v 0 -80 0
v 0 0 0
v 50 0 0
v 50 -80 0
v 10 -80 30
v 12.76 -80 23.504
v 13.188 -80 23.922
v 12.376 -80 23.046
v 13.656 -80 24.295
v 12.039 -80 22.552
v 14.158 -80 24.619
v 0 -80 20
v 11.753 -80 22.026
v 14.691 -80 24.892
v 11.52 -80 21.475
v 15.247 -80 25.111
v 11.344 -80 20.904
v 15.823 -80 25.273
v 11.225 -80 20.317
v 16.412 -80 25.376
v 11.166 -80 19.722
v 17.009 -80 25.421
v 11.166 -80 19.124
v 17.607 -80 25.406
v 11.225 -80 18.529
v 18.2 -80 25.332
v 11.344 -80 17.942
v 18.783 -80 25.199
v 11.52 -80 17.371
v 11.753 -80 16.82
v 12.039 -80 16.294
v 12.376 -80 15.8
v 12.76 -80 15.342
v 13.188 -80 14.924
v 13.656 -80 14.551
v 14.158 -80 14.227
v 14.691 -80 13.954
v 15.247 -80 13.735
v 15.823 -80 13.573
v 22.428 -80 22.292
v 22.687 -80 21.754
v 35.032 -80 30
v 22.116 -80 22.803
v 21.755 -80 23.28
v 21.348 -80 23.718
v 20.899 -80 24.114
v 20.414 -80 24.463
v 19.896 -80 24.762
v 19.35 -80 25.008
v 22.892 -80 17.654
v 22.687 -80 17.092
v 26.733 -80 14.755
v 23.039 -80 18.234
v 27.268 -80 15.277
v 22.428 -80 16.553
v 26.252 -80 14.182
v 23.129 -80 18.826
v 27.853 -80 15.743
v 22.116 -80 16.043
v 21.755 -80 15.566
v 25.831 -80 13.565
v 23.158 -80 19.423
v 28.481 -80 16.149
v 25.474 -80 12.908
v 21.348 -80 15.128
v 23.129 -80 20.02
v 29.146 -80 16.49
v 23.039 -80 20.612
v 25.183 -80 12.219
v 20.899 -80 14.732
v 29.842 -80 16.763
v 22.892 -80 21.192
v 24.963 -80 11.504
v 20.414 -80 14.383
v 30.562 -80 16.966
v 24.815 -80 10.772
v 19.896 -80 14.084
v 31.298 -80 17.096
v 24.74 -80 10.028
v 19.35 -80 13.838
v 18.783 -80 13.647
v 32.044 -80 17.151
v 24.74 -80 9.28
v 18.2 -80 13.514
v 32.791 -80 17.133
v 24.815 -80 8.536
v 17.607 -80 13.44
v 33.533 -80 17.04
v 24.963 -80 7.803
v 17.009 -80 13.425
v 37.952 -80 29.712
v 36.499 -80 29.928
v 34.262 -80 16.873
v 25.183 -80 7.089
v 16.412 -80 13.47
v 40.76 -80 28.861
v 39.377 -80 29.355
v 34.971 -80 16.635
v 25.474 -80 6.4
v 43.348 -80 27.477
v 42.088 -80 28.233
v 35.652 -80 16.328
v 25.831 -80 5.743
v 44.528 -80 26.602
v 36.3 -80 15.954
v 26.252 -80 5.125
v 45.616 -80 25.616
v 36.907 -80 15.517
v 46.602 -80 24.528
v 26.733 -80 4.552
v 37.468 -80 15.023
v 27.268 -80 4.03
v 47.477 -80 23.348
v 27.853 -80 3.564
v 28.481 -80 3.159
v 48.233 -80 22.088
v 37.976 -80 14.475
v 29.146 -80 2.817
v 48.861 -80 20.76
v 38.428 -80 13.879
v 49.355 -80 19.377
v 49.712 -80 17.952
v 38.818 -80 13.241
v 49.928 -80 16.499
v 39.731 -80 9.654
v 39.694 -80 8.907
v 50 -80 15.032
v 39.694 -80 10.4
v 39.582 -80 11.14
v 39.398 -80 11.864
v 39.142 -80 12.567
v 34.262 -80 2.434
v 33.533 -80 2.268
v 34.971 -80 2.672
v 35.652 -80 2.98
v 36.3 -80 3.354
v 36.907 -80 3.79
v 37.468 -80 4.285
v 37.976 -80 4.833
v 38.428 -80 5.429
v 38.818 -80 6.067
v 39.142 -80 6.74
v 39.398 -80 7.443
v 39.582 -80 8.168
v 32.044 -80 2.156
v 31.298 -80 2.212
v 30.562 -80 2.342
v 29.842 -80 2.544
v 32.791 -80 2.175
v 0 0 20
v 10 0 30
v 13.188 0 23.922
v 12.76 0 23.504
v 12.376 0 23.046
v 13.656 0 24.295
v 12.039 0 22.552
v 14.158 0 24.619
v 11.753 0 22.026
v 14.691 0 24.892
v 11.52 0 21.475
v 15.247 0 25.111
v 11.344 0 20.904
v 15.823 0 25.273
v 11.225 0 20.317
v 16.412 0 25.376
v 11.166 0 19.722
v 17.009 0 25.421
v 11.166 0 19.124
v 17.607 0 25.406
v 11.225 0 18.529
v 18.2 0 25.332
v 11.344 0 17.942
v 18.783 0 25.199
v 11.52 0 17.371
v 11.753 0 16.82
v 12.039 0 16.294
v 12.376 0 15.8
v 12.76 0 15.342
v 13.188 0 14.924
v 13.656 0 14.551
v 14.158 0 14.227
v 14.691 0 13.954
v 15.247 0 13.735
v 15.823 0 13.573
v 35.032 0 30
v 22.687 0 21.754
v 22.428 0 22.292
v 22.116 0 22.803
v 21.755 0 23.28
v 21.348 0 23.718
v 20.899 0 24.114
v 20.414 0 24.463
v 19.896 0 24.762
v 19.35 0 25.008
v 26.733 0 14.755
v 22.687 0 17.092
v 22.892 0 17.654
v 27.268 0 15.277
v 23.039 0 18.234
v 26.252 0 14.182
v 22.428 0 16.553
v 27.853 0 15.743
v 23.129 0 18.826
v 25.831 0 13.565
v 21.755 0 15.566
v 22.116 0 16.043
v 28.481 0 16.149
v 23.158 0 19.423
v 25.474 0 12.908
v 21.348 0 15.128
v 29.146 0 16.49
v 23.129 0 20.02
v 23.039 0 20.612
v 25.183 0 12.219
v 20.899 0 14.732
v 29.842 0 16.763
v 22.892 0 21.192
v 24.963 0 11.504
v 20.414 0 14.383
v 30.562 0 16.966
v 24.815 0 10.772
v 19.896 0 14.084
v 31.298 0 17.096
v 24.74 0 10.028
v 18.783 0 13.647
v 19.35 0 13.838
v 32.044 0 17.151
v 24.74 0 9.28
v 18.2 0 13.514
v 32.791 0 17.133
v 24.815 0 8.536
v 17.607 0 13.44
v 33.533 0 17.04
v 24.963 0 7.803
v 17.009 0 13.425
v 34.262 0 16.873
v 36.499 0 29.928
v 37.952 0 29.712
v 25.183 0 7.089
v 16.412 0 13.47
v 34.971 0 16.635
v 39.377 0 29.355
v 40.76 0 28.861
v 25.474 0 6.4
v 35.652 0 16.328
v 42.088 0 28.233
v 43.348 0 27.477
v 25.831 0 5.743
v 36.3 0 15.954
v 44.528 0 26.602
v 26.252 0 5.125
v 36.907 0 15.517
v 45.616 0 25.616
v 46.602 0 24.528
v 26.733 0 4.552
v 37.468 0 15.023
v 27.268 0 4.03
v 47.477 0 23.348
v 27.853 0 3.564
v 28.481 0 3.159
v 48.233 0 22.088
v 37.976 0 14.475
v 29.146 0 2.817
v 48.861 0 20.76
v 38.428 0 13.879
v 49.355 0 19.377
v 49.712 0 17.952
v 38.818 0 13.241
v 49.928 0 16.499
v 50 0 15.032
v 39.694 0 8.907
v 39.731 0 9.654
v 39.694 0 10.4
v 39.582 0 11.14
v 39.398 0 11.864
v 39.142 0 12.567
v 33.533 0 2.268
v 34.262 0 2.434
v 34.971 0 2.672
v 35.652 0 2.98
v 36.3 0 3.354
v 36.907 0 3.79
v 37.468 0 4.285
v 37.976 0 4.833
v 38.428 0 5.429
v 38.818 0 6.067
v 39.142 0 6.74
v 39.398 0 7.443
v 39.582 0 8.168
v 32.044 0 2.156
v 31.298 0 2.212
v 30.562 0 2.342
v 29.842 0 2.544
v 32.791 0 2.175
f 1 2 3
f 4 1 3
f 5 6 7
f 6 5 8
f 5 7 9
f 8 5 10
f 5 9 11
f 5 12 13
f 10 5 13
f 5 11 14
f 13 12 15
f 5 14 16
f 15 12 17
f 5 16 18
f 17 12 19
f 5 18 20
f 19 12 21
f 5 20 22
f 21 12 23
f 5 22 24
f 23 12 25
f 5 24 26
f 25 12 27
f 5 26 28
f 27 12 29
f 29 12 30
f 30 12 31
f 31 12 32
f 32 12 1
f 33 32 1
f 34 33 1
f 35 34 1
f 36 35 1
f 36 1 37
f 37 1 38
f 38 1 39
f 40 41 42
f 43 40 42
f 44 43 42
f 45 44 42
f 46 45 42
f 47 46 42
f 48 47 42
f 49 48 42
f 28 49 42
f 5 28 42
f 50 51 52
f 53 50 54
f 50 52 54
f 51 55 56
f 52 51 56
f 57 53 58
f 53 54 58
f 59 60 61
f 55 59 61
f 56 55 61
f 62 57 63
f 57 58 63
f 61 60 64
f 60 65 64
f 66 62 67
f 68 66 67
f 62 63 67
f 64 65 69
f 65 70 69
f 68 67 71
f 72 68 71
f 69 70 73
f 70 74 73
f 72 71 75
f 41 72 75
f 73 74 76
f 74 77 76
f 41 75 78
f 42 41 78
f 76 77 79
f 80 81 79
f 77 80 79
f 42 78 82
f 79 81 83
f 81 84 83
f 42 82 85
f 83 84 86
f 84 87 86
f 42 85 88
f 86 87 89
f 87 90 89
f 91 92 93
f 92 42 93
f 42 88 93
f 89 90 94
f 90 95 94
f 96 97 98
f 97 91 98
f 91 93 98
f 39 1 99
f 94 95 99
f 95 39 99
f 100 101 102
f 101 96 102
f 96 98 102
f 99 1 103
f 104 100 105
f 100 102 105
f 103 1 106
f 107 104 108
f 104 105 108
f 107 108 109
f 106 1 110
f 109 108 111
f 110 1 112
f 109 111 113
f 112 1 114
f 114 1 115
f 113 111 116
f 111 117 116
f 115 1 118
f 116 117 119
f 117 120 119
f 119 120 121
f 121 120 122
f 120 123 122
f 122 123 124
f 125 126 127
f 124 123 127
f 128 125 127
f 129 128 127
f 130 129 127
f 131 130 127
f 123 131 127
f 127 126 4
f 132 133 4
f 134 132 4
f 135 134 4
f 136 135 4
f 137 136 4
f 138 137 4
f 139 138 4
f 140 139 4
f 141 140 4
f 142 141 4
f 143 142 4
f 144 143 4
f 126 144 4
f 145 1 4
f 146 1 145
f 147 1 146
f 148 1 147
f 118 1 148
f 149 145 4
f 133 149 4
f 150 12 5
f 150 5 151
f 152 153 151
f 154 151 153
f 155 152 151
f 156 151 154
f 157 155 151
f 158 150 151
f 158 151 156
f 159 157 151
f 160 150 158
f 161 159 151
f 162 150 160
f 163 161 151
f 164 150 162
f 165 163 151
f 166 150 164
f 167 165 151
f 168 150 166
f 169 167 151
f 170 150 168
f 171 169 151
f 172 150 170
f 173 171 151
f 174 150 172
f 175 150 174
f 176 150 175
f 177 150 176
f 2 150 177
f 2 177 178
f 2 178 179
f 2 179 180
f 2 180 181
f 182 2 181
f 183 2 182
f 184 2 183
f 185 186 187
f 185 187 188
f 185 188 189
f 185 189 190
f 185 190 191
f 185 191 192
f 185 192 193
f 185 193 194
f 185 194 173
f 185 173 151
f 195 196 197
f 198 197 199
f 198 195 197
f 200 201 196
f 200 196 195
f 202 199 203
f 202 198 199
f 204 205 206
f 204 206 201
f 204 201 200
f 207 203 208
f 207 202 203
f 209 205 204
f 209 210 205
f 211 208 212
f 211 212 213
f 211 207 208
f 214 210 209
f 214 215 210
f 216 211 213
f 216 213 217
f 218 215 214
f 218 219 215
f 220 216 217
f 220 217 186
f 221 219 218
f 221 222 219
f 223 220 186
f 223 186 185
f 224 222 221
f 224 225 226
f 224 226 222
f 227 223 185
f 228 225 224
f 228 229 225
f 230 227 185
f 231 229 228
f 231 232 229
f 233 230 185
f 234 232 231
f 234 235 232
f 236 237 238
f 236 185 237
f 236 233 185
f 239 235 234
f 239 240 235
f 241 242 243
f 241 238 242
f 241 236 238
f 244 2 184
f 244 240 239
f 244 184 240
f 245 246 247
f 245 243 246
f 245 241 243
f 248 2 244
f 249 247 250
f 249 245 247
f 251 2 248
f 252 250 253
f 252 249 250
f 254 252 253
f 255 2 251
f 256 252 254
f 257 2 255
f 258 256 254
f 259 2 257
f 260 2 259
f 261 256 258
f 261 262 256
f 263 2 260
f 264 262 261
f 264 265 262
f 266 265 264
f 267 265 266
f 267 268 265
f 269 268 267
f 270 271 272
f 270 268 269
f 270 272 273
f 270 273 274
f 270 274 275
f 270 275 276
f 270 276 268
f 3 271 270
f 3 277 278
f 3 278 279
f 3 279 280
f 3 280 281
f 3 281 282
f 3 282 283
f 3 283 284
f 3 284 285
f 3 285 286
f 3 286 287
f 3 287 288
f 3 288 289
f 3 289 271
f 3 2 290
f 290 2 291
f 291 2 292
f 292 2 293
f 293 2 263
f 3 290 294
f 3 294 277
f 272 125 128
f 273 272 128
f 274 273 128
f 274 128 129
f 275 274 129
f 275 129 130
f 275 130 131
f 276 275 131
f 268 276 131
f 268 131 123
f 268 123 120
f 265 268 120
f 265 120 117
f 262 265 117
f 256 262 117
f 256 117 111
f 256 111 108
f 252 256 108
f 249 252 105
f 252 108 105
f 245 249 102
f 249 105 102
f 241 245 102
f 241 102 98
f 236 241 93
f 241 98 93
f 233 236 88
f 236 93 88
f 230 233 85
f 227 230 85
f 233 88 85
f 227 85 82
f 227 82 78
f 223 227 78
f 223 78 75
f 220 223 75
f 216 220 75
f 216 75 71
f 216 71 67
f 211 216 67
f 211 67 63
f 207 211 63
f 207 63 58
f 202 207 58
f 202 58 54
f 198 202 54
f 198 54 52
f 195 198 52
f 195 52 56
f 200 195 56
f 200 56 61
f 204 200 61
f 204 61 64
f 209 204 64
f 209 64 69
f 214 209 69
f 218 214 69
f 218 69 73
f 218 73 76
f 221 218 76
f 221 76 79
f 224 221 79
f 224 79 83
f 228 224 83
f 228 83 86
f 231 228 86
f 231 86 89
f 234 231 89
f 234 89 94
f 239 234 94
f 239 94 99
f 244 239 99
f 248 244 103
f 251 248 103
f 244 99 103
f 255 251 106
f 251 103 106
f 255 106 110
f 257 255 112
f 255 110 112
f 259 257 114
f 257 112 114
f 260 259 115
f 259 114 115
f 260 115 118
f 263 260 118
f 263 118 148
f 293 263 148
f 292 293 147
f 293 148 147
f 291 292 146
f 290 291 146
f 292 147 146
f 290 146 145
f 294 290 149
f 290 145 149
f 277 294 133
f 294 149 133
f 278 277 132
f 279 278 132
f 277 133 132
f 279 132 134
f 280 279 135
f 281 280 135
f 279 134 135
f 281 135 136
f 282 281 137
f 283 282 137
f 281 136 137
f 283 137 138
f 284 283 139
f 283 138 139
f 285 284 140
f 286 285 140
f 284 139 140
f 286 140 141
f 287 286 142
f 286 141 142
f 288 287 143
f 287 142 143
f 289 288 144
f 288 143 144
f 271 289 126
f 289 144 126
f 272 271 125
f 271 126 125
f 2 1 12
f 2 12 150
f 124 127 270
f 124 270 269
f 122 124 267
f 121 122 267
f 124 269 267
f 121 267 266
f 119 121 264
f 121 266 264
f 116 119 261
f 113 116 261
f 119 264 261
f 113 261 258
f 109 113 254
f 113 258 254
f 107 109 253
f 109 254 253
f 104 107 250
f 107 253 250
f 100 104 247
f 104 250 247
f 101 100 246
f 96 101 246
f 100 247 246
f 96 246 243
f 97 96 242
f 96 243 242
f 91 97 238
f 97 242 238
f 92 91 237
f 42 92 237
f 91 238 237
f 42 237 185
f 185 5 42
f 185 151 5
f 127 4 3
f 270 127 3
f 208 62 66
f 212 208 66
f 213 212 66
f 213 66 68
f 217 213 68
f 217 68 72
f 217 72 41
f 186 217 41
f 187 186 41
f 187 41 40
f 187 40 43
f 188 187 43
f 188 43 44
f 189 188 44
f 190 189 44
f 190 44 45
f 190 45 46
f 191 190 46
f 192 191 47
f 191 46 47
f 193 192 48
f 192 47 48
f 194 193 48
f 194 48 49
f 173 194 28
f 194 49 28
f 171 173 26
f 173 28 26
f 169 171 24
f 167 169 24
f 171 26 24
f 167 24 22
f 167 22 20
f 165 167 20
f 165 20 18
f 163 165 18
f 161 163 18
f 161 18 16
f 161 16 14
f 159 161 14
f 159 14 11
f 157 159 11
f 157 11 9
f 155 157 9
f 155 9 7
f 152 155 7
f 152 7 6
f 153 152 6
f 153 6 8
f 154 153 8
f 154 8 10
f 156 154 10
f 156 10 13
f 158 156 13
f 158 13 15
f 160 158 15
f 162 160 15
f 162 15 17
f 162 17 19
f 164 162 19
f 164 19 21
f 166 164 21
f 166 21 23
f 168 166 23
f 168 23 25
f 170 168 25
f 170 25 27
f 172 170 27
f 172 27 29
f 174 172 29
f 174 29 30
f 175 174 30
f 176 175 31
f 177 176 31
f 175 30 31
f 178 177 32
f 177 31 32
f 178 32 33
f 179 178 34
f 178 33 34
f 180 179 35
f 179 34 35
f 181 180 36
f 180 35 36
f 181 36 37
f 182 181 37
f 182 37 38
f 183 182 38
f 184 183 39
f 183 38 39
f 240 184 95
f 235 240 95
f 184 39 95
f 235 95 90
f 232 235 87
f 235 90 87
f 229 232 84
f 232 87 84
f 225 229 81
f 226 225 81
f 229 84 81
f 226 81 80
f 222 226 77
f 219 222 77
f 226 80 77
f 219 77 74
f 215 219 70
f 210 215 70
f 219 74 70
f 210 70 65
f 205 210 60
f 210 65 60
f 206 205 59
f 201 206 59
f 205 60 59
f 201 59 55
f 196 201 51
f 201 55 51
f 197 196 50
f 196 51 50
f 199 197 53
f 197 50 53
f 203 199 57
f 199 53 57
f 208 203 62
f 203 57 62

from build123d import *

# Parameters (mm, degrees)
F0_W     = 50
F0_H     = 80
F1_DEPTH = 30
F2_R     = 14.968124
F3_SIZE  = 10
F4_R     = 6
F4_R_2   = 7.5
F5_DEPTH = 80.8


with BuildPart() as f1:
    # F0 (on Top) → F1 (new body)
    with BuildSketch(Plane.XY):
        with Locations((25, -40)):
            Rectangle(F0_W, F0_H)
    extrude(amount=F1_DEPTH)

    # F2
    f2_edges = [f1.edges().sort_by_distance(p)[0] for p in [
        (50, -40, 30),
    ]]
    fillet(f2_edges, radius=F2_R)

    # F3
    f3_edges = [f1.edges().sort_by_distance(p)[0] for p in [
        (0, -40, 30),
    ]]
    chamfer(f3_edges, length=F3_SIZE)

    # F4 (on face) → F5 (cut)
    with BuildSketch(Plane.XZ.offset(80)):
        with Locations((17.158328, 19.422975)):
            Circle(F4_R)
        with Locations((32.230863, 9.653739)):
            Circle(F4_R_2)
    extrude(amount=-F5_DEPTH, mode=Mode.SUBTRACT)


solid = f1.part
